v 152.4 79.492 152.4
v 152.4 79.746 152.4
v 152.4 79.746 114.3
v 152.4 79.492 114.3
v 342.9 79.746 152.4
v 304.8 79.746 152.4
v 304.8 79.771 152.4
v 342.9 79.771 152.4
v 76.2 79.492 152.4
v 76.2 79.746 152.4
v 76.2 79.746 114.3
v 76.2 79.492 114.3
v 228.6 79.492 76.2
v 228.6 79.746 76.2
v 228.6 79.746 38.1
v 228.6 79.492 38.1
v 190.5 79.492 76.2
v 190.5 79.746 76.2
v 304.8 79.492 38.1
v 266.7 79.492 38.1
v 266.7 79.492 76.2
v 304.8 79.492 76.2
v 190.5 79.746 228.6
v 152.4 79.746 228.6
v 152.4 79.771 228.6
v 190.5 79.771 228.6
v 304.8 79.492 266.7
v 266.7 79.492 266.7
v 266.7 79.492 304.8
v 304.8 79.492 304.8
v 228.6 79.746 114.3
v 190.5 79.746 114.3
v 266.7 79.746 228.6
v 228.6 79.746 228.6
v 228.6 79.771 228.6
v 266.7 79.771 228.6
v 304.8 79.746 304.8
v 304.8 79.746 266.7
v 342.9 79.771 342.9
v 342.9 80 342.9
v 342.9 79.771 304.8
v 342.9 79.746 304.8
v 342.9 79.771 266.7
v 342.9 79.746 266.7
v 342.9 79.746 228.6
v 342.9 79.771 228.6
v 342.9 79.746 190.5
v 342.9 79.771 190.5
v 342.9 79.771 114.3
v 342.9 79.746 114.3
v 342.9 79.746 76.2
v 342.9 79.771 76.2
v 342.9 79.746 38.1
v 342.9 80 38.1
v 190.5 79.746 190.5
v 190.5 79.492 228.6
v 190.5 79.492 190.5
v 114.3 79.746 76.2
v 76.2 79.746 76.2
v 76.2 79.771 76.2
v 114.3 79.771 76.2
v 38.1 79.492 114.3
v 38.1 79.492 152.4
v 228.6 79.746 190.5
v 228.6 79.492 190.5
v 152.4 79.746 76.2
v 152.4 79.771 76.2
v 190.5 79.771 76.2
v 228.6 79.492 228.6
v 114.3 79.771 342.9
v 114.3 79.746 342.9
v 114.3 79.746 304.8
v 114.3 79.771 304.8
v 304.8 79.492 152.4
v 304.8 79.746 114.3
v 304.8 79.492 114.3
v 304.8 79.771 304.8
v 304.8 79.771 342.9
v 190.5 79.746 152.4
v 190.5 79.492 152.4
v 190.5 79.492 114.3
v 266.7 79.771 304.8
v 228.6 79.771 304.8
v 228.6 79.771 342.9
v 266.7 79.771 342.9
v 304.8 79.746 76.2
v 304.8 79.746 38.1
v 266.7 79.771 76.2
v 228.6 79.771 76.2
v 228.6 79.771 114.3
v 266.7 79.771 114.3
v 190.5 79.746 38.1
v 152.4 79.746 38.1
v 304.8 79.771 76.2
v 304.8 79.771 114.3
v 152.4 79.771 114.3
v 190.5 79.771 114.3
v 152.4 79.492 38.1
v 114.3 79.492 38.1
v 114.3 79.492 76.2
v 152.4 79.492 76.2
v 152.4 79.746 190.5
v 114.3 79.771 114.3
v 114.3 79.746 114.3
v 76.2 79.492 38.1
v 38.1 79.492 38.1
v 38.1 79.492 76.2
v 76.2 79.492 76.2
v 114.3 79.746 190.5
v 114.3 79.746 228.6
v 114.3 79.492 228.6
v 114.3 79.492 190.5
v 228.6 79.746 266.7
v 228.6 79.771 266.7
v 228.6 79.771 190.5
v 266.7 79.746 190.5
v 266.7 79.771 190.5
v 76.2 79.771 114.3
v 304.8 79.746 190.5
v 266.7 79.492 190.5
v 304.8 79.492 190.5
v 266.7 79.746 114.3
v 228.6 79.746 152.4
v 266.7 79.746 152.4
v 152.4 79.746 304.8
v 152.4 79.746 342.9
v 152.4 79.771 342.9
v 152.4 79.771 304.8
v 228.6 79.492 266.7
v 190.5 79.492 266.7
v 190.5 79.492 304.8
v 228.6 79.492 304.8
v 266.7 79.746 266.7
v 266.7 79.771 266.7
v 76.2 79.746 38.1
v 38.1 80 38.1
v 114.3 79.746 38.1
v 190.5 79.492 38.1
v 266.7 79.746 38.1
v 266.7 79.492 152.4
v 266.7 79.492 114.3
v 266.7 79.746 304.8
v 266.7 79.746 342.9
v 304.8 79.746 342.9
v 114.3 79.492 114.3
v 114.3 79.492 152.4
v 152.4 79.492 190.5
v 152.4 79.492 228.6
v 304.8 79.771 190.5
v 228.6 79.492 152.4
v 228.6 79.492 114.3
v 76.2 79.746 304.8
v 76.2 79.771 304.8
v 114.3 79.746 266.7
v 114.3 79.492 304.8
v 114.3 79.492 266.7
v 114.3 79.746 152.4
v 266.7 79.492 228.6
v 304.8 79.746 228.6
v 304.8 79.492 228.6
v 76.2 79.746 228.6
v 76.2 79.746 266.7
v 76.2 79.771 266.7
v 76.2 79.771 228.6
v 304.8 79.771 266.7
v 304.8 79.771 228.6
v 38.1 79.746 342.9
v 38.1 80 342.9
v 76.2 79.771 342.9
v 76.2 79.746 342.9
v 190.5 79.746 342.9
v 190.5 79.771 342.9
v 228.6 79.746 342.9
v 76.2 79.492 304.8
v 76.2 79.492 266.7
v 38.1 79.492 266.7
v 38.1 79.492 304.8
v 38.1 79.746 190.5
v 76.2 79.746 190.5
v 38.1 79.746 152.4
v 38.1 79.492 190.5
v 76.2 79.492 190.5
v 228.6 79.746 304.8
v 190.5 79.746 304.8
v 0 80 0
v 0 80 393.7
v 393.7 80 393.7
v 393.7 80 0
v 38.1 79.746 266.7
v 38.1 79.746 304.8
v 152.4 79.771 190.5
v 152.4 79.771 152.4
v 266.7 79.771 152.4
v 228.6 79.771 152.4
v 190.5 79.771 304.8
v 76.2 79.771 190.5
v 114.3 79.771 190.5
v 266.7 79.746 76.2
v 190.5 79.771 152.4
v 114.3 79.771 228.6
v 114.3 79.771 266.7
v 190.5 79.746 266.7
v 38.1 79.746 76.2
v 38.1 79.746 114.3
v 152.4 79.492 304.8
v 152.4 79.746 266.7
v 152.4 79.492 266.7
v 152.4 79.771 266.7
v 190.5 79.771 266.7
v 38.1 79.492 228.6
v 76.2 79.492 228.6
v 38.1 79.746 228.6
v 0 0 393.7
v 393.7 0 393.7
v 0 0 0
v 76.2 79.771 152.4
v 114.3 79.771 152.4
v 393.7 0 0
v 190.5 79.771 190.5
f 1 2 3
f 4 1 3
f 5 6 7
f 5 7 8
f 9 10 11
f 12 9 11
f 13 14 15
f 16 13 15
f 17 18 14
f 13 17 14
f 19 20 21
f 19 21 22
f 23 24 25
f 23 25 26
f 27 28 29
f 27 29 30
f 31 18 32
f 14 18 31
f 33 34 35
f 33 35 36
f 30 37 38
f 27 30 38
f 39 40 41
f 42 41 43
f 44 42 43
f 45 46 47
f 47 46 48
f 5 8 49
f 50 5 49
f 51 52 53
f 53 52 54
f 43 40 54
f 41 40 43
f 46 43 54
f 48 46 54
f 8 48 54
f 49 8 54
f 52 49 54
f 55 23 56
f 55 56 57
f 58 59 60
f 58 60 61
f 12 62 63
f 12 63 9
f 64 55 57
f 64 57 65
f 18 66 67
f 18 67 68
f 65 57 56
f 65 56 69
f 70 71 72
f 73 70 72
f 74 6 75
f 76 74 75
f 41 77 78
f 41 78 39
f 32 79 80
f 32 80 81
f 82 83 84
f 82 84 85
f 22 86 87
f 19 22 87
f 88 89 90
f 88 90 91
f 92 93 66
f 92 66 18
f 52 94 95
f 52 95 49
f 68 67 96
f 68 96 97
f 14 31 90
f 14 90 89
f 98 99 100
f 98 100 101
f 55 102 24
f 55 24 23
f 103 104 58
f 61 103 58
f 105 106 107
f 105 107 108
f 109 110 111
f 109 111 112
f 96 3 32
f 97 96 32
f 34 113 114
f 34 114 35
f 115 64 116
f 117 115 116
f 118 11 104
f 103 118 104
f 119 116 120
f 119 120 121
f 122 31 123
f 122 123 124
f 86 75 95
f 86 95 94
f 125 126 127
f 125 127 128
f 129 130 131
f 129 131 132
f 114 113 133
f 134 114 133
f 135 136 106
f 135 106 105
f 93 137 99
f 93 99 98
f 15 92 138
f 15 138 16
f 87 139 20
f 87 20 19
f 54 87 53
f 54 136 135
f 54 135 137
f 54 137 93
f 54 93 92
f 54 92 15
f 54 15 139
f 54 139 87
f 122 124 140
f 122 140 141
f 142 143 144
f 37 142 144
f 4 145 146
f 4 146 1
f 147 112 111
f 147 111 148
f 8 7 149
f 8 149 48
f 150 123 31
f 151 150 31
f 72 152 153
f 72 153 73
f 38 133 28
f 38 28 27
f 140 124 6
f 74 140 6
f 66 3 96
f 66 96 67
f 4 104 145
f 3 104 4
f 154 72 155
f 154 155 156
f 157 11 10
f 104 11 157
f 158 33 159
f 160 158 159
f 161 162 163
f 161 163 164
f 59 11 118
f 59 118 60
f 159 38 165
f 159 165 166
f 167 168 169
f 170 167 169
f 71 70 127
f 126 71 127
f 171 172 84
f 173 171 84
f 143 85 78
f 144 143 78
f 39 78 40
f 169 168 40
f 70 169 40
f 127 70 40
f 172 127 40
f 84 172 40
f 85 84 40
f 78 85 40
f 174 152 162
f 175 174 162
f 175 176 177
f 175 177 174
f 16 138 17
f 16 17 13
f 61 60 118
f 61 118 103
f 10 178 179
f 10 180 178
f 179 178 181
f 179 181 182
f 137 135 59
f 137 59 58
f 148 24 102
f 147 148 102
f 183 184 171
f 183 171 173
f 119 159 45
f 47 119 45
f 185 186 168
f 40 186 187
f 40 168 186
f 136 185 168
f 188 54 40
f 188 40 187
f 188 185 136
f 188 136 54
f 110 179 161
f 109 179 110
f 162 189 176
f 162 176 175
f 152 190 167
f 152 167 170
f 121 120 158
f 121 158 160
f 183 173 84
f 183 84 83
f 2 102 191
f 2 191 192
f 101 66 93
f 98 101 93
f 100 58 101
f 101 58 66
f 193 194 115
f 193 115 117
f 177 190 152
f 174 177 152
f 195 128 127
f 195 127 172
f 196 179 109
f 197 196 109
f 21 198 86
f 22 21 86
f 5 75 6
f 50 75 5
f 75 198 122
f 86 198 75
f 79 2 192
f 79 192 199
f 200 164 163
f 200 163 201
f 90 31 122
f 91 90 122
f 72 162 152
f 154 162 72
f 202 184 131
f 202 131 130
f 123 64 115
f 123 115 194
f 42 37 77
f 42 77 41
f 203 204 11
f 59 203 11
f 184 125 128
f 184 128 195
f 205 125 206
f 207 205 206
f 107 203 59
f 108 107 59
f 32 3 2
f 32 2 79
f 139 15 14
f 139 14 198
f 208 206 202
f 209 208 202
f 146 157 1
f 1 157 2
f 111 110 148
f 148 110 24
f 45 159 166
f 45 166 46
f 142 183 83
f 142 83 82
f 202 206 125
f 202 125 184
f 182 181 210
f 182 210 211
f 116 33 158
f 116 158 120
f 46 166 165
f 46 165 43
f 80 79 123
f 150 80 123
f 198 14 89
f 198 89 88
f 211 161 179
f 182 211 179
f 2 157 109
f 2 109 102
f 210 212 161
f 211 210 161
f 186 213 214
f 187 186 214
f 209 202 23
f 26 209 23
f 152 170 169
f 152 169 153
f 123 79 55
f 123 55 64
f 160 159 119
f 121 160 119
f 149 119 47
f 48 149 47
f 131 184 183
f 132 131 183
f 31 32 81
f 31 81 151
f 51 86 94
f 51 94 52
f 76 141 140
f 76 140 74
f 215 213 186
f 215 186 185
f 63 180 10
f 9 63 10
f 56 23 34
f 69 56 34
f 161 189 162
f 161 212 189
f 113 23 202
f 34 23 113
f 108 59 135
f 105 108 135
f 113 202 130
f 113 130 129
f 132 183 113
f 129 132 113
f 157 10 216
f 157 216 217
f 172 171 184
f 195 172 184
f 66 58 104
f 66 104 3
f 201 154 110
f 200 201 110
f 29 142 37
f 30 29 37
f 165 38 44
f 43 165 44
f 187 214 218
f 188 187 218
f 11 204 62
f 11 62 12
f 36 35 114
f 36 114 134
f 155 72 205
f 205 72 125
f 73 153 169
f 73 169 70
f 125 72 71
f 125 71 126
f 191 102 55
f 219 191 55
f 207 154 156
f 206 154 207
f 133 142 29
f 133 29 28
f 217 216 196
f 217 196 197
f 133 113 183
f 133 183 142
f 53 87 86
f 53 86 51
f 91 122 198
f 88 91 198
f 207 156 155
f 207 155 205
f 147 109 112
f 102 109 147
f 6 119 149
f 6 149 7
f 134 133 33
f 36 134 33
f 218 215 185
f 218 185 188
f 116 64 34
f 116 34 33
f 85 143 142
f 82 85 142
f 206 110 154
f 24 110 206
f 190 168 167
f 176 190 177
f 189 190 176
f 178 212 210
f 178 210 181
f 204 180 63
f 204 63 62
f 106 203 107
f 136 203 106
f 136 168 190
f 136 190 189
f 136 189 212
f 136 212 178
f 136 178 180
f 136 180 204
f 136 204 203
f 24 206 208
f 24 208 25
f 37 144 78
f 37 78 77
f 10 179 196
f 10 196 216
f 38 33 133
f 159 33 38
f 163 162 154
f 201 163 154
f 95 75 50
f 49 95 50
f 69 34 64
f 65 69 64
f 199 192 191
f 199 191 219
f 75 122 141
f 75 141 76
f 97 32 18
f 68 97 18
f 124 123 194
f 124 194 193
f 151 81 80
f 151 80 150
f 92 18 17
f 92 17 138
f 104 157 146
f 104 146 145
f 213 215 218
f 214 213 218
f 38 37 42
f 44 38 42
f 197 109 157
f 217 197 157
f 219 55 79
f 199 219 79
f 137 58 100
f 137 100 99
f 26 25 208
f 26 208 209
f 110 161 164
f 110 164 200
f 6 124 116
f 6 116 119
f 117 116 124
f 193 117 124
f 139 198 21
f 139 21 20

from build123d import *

# Parameters (mm, degrees)
SKETCH1_W                       = 393.7
SKETCH1_H                       = 393.7
BOSS_EXTRUDE1_DEPTH             = 80
ESQUISSE1_W                     = 304.8
ESQUISSE1_H                     = 304.8
ENL_V_MAT_EXTRU_1_DEPTH         = 0.254
ESQUISSE4_W                     = 38.1
ESQUISSE4_H                     = 38.1
ENL_V_MAT_EXTRU_2_DEPTH         = 0.254
R_P_TITION_LIN_AIRE1_COUNT      = 4
R_P_TITION_LIN_AIRE1_PITCH      = 76.2
R_P_TITION_LIN_AIRE1_COUNT_DIR2 = 4
R_P_TITION_LIN_AIRE1_PITCH_DIR2 = 76.2
ESQUISSE5_W                     = 38.1
ESQUISSE5_H                     = 38.1
BOSS_EXTRU_1_DEPTH              = 0.0254
R_P_TITION_LIN_AIRE2_COUNT      = 4
R_P_TITION_LIN_AIRE2_PITCH      = 76.2
R_P_TITION_LIN_AIRE2_COUNT_DIR2 = 4
R_P_TITION_LIN_AIRE2_PITCH_DIR2 = 76.2


with BuildPart() as part:
    # Sketch1 → Boss-Extrude1 (new body)
    with BuildSketch(Plane(origin=(0, 0, 0), x_dir=(1, 0, 0), z_dir=(0, 1, 0))):
        with Locations((196.85, -196.85)):
            Rectangle(SKETCH1_W, SKETCH1_H)
    extrude(amount=BOSS_EXTRUDE1_DEPTH)

    # Esquisse1 → Enlèv. mat.-Extru.1 (cut)
    with BuildSketch(Plane(origin=(0, 80, 0), x_dir=(1, 0, 0), z_dir=(0, 1, 0))):
        with Locations((190.5, -190.5)):
            Rectangle(ESQUISSE1_W, ESQUISSE1_H)
    extrude(amount=-ENL_V_MAT_EXTRU_1_DEPTH, mode=Mode.SUBTRACT)

    # Esquisse4 → Enlèv. mat.-Extru.2 (cut)
    with BuildSketch(Plane(origin=(0, 79.746, 0), x_dir=(1, 0, 0), z_dir=(0, 1, 0))):
        with Locations((57.15, -57.15)):
            Rectangle(ESQUISSE4_W, ESQUISSE4_H)
    enl_v_mat_extru_2 = extrude(amount=-ENL_V_MAT_EXTRU_2_DEPTH, mode=Mode.SUBTRACT)

    # Répétition linéaire1: Enl_v. mat.-Extru.2 4 × 4
    with Locations(*[(i * R_P_TITION_LIN_AIRE1_PITCH, 0, j * R_P_TITION_LIN_AIRE1_PITCH_DIR2) for i in range(R_P_TITION_LIN_AIRE1_COUNT) for j in range(R_P_TITION_LIN_AIRE1_COUNT_DIR2) if (i, j) != (0, 0)]):
        add(enl_v_mat_extru_2, mode=Mode.SUBTRACT)

    # Esquisse5 → Boss.-Extru.1 (add)
    with BuildSketch(Plane(origin=(0, 79.746, 0), x_dir=(1, 0, 0), z_dir=(0, 1, 0))):
        with Locations((95.25, -95.25)):
            Rectangle(ESQUISSE5_W, ESQUISSE5_H)
    boss_extru_1 = extrude(amount=BOSS_EXTRU_1_DEPTH)

    # Répétition linéaire2: Boss.-Extru.1 4 × 4
    with Locations(*[(j * R_P_TITION_LIN_AIRE2_PITCH_DIR2, 0, i * R_P_TITION_LIN_AIRE2_PITCH) for i in range(R_P_TITION_LIN_AIRE2_COUNT) for j in range(R_P_TITION_LIN_AIRE2_COUNT_DIR2) if (i, j) != (0, 0)]):
        add(boss_extru_1)


solid = part.part
